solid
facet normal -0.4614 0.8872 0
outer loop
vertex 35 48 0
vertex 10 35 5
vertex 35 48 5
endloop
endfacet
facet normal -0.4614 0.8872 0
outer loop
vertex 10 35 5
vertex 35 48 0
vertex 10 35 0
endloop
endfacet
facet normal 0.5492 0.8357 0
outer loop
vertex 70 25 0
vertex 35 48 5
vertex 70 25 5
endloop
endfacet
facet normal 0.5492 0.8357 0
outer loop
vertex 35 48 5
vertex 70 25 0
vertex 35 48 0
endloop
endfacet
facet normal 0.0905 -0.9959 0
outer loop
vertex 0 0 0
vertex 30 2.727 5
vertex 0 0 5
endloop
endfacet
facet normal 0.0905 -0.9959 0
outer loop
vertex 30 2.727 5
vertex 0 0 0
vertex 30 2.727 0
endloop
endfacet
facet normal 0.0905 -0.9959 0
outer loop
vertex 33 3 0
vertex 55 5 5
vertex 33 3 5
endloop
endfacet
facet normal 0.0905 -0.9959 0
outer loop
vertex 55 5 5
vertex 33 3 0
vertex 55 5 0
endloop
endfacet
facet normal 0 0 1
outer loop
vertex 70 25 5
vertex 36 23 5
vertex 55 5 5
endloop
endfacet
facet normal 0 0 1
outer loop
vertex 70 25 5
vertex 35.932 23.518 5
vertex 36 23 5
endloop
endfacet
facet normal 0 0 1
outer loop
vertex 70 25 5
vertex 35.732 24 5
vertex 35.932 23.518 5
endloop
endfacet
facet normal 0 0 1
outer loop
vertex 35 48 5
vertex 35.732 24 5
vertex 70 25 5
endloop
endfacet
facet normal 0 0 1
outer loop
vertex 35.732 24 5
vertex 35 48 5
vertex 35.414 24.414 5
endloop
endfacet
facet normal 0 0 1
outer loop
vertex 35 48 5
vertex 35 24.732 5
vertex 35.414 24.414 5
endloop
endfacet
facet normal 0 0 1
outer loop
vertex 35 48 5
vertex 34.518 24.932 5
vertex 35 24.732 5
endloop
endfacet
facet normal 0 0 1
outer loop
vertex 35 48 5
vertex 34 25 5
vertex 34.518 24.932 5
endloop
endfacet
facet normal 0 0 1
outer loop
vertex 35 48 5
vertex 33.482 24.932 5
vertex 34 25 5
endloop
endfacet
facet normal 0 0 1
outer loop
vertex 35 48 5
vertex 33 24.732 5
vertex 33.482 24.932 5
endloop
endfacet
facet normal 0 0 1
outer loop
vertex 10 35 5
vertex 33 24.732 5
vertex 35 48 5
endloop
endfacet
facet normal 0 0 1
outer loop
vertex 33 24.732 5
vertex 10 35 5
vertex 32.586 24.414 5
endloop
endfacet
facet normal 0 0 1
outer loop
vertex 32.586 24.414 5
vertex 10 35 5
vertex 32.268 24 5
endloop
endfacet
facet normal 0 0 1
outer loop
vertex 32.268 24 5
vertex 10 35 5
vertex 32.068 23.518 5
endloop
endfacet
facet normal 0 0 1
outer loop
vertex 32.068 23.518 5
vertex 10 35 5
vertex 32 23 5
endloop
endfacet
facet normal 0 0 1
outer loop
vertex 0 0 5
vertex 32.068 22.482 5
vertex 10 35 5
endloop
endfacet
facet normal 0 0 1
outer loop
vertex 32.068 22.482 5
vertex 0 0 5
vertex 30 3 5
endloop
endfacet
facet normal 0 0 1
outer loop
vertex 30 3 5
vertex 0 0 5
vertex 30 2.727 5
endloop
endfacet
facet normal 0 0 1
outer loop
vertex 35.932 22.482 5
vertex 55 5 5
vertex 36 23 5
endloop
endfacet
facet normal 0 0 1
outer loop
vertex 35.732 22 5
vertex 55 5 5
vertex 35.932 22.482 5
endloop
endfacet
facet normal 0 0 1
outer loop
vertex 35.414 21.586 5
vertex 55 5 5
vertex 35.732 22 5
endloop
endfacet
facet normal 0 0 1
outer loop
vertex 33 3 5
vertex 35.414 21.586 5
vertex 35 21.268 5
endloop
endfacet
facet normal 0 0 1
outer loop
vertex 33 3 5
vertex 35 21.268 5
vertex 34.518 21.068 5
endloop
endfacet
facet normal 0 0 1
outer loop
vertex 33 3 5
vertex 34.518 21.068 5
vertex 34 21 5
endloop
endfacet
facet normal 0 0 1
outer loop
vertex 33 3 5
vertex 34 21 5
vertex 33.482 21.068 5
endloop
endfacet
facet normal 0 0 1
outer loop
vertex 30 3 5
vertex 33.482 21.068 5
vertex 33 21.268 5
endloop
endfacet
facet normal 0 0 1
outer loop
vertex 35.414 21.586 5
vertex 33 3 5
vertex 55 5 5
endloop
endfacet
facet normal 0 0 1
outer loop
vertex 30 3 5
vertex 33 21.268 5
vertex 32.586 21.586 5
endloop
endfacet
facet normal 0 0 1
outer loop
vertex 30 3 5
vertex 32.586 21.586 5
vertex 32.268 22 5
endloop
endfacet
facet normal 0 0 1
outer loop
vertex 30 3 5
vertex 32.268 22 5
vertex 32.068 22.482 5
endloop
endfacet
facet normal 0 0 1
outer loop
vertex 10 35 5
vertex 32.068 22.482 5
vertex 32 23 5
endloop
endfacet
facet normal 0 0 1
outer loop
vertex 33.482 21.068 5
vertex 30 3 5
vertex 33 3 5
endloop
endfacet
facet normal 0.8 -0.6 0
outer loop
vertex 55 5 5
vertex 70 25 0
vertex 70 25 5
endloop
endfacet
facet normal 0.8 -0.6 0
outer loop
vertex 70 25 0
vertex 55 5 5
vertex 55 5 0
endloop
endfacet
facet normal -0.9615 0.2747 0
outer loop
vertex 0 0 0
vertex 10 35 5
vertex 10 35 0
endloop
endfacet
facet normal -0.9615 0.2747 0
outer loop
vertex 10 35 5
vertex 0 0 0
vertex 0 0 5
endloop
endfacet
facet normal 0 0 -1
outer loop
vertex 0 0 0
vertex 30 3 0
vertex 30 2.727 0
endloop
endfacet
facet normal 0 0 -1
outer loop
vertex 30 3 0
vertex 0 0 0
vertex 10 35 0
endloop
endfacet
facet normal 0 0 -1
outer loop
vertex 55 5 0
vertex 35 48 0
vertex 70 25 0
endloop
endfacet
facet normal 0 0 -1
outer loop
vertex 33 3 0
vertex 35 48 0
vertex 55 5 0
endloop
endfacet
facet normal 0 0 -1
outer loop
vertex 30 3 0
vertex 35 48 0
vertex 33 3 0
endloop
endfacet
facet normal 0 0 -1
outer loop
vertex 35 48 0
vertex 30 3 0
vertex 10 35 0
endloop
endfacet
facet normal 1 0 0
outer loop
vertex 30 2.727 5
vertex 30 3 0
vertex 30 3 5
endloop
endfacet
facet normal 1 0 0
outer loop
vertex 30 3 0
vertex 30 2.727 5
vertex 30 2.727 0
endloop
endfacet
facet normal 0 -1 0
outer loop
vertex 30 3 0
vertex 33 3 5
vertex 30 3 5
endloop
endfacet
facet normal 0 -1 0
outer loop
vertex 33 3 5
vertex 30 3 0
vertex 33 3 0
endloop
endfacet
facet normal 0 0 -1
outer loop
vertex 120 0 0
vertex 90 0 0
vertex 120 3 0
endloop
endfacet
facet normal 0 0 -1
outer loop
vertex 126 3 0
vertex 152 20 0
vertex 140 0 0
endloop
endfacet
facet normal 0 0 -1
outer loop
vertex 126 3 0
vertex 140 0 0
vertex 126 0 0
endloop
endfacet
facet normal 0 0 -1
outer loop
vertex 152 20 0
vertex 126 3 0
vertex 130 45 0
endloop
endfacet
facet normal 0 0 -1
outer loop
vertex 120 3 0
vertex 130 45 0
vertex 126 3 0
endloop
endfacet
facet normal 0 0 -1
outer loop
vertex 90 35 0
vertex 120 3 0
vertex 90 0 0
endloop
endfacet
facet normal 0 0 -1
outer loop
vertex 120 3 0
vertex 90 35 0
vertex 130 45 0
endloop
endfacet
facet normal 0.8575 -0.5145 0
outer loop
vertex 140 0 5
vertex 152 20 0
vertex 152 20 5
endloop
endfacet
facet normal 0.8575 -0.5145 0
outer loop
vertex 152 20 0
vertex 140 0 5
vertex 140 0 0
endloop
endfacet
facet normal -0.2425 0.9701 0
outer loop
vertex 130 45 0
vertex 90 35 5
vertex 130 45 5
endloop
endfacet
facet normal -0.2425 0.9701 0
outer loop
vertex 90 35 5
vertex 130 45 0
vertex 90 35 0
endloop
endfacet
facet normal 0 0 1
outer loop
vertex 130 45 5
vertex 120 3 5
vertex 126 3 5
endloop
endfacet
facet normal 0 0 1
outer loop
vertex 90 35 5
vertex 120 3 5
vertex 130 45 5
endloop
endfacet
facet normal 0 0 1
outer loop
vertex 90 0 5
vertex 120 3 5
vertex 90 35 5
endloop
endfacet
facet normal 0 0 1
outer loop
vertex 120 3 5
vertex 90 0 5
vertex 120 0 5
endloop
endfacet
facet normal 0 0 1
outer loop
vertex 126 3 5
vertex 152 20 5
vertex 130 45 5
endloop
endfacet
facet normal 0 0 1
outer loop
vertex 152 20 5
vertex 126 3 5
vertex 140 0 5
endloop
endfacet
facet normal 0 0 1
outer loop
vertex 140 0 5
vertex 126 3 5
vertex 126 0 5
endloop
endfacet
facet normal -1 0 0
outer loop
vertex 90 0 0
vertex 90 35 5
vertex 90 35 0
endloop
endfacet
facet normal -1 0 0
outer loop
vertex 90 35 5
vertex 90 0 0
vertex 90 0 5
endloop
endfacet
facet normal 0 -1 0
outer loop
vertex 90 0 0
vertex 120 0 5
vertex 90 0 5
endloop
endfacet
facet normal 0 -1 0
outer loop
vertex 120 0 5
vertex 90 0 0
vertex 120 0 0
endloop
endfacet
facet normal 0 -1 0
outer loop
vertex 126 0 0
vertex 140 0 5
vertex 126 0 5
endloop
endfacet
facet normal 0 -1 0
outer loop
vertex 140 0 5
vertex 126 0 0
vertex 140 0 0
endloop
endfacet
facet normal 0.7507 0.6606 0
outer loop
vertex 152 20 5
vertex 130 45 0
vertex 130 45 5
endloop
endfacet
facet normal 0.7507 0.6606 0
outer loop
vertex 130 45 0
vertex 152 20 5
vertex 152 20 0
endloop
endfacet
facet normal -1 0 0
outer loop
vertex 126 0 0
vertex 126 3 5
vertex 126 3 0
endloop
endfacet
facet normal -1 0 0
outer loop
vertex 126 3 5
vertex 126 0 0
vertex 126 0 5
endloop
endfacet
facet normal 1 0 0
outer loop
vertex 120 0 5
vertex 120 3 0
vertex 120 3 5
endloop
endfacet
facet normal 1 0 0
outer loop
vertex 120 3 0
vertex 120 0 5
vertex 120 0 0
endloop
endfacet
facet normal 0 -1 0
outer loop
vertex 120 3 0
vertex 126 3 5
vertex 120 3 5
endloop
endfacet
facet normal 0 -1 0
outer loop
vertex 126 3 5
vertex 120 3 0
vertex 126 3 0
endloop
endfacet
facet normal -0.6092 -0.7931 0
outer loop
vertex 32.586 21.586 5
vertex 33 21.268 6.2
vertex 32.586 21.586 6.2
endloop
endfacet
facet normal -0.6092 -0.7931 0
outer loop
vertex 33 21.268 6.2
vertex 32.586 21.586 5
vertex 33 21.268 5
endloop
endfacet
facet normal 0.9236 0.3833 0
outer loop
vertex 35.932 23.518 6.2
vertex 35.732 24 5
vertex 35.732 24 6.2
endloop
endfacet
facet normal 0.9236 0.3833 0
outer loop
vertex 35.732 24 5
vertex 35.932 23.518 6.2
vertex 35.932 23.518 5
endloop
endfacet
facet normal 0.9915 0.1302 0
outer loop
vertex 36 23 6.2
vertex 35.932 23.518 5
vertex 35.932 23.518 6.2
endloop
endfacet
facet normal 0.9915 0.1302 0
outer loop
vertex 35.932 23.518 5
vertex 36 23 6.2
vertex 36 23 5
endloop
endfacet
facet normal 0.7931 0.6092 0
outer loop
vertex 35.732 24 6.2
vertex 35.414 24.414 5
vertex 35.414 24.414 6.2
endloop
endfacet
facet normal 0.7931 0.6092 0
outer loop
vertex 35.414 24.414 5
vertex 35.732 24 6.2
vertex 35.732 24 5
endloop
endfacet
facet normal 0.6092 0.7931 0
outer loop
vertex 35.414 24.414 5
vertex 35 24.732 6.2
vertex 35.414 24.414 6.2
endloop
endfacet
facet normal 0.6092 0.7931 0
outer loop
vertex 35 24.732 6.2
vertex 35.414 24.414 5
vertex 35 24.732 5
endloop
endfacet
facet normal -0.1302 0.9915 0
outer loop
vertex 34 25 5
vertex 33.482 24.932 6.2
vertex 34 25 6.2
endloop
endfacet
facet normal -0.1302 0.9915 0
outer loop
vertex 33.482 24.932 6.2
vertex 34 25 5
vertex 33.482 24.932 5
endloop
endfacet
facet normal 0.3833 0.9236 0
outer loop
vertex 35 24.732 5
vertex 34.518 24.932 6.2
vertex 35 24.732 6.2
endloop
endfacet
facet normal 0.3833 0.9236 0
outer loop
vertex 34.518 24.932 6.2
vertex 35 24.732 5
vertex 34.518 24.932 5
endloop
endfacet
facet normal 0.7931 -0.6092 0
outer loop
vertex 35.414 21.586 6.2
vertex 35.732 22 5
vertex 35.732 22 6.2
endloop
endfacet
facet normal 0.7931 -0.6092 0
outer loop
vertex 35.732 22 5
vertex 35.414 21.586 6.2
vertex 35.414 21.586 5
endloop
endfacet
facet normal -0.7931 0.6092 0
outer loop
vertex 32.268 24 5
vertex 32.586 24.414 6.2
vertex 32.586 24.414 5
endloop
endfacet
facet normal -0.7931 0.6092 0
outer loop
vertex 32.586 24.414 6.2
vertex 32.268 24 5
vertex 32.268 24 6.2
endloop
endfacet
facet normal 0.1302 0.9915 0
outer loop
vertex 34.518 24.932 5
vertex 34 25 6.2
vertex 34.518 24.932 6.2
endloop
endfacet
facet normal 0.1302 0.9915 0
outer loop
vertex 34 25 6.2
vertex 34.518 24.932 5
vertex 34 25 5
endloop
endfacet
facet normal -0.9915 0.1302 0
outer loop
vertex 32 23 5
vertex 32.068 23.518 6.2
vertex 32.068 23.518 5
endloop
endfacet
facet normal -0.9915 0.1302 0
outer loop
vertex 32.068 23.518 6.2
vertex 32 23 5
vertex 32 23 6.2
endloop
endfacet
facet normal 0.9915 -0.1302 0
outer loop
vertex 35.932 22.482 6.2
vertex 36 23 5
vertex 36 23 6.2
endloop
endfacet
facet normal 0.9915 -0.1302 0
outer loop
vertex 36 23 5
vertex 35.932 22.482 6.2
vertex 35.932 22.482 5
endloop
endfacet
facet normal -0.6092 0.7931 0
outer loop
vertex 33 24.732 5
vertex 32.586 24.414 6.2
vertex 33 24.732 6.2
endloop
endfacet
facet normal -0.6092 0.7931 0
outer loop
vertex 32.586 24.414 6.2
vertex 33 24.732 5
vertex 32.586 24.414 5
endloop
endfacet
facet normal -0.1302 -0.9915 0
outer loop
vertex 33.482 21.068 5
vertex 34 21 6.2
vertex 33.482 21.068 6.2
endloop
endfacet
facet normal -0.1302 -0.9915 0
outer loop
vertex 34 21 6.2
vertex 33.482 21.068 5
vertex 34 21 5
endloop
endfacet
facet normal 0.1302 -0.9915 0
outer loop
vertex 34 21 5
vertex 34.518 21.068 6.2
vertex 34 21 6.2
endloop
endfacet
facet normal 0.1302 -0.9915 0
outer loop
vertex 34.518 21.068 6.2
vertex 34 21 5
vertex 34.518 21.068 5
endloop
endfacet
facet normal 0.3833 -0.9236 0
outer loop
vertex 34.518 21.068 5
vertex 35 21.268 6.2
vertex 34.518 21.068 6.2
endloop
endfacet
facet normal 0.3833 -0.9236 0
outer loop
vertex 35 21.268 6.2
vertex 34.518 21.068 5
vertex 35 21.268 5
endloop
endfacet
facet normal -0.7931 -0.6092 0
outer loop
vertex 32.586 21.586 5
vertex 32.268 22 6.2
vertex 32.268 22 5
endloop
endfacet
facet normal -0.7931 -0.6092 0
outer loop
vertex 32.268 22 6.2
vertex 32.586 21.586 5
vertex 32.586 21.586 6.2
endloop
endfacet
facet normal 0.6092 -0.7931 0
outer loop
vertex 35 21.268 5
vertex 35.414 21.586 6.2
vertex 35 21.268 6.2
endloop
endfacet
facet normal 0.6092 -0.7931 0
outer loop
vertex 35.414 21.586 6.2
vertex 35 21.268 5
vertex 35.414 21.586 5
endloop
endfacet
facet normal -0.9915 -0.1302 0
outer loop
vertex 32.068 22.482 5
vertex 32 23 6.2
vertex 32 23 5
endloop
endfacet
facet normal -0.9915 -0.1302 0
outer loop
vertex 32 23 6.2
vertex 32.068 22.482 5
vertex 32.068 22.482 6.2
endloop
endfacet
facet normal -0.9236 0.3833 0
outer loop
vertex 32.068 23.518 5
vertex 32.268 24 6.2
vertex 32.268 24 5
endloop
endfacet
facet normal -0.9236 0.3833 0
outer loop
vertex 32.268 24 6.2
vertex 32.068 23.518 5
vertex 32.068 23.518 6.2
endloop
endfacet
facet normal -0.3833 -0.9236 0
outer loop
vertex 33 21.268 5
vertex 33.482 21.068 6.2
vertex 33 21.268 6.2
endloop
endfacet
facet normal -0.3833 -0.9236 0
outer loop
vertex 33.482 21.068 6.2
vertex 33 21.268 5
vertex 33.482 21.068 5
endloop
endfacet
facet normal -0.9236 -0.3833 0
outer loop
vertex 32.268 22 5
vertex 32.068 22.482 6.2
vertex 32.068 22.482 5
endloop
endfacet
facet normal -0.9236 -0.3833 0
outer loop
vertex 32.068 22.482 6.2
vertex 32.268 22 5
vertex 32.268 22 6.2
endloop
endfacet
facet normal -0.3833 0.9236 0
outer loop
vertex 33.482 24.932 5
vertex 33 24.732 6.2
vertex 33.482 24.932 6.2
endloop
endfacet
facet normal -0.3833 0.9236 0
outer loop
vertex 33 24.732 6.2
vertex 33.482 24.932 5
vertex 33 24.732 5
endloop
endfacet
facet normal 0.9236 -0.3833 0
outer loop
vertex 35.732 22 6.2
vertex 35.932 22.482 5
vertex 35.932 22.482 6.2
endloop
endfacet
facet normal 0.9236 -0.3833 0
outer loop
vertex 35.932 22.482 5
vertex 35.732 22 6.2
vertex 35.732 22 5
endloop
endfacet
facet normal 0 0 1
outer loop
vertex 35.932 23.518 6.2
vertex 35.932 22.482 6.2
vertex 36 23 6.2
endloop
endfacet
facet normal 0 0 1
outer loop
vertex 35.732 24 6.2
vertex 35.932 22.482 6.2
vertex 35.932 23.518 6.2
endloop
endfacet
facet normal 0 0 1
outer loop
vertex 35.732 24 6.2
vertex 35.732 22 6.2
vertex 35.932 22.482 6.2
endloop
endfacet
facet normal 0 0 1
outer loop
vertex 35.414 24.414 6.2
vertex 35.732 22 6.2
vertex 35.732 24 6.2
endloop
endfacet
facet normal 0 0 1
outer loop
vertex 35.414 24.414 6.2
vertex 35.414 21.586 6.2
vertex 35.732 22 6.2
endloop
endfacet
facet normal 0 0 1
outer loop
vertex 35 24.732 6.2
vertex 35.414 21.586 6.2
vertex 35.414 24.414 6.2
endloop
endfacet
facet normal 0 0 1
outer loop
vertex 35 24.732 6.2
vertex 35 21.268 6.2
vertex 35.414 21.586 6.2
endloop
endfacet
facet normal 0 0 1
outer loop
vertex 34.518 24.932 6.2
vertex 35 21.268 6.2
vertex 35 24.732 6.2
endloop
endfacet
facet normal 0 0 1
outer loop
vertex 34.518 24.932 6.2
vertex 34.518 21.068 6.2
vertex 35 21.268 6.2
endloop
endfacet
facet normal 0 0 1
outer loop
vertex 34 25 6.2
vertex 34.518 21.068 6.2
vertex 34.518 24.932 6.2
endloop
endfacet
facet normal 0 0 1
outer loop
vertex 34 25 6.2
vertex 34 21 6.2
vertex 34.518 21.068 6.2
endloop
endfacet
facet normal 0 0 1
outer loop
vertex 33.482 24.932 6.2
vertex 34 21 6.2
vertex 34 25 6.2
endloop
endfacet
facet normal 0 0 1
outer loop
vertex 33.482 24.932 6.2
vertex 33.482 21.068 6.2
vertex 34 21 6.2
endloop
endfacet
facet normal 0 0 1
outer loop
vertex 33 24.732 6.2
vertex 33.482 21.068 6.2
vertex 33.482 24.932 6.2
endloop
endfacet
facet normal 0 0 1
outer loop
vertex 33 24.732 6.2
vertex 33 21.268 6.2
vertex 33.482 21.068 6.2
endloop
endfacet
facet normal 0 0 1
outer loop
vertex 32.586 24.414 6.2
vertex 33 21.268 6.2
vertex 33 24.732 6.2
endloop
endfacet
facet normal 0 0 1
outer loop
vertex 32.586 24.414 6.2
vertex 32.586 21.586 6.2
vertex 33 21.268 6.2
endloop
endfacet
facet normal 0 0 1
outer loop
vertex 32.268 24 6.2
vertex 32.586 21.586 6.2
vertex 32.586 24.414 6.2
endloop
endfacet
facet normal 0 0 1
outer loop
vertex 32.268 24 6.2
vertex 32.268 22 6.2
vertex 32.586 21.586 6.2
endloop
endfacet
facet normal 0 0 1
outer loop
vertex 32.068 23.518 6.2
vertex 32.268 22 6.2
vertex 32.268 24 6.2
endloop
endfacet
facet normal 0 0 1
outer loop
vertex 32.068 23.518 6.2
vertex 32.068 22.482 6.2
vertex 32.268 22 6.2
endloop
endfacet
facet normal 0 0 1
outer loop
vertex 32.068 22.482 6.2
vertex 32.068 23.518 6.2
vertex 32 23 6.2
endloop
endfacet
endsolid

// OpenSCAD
/*
Title: Center of Mass Balancer
Folder: 12_center_of_mass
Physics Topic: Center of mass and stability
Difficulty: Beginner-Intermediate
Print Type: FDM, single material
Teaches: Conceptual mechanics
Use Case: Classroom manipulative
*/


// --------------------
// Parameters
// --------------------
thickness = 5;
show_com_marker = true;

module irregular_shape_a(){
    linear_extrude(height=thickness)
      polygon(points=[[0,0],[55,5],[70,25],[35,48],[10,35]]);
}
module irregular_shape_b(){
    linear_extrude(height=thickness)
      polygon(points=[[0,0],[50,0],[62,20],[40,45],[0,35]]);
}
module balance_notch(){
    translate([30,-3,0]) cube([6,6,thickness]);
}

module balancer_set(){
    difference(){ irregular_shape_a(); balance_notch(); }
    if(show_com_marker) translate([34,23,thickness]) cylinder(h=1.2,d=4,$fn=24);
    translate([90,0,0]) difference(){ irregular_shape_b(); balance_notch(); }
}

// --------------------
// Physics Meaning
// --------------------
// Object balances when support point lies directly below COM projection.

// --------------------
// Learning Notes
// --------------------
// Hide COM marker variant and challenge prediction before testing.

// --------------------
// Print Notes
// --------------------
// Print flat. Notch edges may need slight deburring.

// --------------------
// Customization Ideas
// --------------------
// Add hanging-hole version for plumb-line COM method.

balancer_set();
